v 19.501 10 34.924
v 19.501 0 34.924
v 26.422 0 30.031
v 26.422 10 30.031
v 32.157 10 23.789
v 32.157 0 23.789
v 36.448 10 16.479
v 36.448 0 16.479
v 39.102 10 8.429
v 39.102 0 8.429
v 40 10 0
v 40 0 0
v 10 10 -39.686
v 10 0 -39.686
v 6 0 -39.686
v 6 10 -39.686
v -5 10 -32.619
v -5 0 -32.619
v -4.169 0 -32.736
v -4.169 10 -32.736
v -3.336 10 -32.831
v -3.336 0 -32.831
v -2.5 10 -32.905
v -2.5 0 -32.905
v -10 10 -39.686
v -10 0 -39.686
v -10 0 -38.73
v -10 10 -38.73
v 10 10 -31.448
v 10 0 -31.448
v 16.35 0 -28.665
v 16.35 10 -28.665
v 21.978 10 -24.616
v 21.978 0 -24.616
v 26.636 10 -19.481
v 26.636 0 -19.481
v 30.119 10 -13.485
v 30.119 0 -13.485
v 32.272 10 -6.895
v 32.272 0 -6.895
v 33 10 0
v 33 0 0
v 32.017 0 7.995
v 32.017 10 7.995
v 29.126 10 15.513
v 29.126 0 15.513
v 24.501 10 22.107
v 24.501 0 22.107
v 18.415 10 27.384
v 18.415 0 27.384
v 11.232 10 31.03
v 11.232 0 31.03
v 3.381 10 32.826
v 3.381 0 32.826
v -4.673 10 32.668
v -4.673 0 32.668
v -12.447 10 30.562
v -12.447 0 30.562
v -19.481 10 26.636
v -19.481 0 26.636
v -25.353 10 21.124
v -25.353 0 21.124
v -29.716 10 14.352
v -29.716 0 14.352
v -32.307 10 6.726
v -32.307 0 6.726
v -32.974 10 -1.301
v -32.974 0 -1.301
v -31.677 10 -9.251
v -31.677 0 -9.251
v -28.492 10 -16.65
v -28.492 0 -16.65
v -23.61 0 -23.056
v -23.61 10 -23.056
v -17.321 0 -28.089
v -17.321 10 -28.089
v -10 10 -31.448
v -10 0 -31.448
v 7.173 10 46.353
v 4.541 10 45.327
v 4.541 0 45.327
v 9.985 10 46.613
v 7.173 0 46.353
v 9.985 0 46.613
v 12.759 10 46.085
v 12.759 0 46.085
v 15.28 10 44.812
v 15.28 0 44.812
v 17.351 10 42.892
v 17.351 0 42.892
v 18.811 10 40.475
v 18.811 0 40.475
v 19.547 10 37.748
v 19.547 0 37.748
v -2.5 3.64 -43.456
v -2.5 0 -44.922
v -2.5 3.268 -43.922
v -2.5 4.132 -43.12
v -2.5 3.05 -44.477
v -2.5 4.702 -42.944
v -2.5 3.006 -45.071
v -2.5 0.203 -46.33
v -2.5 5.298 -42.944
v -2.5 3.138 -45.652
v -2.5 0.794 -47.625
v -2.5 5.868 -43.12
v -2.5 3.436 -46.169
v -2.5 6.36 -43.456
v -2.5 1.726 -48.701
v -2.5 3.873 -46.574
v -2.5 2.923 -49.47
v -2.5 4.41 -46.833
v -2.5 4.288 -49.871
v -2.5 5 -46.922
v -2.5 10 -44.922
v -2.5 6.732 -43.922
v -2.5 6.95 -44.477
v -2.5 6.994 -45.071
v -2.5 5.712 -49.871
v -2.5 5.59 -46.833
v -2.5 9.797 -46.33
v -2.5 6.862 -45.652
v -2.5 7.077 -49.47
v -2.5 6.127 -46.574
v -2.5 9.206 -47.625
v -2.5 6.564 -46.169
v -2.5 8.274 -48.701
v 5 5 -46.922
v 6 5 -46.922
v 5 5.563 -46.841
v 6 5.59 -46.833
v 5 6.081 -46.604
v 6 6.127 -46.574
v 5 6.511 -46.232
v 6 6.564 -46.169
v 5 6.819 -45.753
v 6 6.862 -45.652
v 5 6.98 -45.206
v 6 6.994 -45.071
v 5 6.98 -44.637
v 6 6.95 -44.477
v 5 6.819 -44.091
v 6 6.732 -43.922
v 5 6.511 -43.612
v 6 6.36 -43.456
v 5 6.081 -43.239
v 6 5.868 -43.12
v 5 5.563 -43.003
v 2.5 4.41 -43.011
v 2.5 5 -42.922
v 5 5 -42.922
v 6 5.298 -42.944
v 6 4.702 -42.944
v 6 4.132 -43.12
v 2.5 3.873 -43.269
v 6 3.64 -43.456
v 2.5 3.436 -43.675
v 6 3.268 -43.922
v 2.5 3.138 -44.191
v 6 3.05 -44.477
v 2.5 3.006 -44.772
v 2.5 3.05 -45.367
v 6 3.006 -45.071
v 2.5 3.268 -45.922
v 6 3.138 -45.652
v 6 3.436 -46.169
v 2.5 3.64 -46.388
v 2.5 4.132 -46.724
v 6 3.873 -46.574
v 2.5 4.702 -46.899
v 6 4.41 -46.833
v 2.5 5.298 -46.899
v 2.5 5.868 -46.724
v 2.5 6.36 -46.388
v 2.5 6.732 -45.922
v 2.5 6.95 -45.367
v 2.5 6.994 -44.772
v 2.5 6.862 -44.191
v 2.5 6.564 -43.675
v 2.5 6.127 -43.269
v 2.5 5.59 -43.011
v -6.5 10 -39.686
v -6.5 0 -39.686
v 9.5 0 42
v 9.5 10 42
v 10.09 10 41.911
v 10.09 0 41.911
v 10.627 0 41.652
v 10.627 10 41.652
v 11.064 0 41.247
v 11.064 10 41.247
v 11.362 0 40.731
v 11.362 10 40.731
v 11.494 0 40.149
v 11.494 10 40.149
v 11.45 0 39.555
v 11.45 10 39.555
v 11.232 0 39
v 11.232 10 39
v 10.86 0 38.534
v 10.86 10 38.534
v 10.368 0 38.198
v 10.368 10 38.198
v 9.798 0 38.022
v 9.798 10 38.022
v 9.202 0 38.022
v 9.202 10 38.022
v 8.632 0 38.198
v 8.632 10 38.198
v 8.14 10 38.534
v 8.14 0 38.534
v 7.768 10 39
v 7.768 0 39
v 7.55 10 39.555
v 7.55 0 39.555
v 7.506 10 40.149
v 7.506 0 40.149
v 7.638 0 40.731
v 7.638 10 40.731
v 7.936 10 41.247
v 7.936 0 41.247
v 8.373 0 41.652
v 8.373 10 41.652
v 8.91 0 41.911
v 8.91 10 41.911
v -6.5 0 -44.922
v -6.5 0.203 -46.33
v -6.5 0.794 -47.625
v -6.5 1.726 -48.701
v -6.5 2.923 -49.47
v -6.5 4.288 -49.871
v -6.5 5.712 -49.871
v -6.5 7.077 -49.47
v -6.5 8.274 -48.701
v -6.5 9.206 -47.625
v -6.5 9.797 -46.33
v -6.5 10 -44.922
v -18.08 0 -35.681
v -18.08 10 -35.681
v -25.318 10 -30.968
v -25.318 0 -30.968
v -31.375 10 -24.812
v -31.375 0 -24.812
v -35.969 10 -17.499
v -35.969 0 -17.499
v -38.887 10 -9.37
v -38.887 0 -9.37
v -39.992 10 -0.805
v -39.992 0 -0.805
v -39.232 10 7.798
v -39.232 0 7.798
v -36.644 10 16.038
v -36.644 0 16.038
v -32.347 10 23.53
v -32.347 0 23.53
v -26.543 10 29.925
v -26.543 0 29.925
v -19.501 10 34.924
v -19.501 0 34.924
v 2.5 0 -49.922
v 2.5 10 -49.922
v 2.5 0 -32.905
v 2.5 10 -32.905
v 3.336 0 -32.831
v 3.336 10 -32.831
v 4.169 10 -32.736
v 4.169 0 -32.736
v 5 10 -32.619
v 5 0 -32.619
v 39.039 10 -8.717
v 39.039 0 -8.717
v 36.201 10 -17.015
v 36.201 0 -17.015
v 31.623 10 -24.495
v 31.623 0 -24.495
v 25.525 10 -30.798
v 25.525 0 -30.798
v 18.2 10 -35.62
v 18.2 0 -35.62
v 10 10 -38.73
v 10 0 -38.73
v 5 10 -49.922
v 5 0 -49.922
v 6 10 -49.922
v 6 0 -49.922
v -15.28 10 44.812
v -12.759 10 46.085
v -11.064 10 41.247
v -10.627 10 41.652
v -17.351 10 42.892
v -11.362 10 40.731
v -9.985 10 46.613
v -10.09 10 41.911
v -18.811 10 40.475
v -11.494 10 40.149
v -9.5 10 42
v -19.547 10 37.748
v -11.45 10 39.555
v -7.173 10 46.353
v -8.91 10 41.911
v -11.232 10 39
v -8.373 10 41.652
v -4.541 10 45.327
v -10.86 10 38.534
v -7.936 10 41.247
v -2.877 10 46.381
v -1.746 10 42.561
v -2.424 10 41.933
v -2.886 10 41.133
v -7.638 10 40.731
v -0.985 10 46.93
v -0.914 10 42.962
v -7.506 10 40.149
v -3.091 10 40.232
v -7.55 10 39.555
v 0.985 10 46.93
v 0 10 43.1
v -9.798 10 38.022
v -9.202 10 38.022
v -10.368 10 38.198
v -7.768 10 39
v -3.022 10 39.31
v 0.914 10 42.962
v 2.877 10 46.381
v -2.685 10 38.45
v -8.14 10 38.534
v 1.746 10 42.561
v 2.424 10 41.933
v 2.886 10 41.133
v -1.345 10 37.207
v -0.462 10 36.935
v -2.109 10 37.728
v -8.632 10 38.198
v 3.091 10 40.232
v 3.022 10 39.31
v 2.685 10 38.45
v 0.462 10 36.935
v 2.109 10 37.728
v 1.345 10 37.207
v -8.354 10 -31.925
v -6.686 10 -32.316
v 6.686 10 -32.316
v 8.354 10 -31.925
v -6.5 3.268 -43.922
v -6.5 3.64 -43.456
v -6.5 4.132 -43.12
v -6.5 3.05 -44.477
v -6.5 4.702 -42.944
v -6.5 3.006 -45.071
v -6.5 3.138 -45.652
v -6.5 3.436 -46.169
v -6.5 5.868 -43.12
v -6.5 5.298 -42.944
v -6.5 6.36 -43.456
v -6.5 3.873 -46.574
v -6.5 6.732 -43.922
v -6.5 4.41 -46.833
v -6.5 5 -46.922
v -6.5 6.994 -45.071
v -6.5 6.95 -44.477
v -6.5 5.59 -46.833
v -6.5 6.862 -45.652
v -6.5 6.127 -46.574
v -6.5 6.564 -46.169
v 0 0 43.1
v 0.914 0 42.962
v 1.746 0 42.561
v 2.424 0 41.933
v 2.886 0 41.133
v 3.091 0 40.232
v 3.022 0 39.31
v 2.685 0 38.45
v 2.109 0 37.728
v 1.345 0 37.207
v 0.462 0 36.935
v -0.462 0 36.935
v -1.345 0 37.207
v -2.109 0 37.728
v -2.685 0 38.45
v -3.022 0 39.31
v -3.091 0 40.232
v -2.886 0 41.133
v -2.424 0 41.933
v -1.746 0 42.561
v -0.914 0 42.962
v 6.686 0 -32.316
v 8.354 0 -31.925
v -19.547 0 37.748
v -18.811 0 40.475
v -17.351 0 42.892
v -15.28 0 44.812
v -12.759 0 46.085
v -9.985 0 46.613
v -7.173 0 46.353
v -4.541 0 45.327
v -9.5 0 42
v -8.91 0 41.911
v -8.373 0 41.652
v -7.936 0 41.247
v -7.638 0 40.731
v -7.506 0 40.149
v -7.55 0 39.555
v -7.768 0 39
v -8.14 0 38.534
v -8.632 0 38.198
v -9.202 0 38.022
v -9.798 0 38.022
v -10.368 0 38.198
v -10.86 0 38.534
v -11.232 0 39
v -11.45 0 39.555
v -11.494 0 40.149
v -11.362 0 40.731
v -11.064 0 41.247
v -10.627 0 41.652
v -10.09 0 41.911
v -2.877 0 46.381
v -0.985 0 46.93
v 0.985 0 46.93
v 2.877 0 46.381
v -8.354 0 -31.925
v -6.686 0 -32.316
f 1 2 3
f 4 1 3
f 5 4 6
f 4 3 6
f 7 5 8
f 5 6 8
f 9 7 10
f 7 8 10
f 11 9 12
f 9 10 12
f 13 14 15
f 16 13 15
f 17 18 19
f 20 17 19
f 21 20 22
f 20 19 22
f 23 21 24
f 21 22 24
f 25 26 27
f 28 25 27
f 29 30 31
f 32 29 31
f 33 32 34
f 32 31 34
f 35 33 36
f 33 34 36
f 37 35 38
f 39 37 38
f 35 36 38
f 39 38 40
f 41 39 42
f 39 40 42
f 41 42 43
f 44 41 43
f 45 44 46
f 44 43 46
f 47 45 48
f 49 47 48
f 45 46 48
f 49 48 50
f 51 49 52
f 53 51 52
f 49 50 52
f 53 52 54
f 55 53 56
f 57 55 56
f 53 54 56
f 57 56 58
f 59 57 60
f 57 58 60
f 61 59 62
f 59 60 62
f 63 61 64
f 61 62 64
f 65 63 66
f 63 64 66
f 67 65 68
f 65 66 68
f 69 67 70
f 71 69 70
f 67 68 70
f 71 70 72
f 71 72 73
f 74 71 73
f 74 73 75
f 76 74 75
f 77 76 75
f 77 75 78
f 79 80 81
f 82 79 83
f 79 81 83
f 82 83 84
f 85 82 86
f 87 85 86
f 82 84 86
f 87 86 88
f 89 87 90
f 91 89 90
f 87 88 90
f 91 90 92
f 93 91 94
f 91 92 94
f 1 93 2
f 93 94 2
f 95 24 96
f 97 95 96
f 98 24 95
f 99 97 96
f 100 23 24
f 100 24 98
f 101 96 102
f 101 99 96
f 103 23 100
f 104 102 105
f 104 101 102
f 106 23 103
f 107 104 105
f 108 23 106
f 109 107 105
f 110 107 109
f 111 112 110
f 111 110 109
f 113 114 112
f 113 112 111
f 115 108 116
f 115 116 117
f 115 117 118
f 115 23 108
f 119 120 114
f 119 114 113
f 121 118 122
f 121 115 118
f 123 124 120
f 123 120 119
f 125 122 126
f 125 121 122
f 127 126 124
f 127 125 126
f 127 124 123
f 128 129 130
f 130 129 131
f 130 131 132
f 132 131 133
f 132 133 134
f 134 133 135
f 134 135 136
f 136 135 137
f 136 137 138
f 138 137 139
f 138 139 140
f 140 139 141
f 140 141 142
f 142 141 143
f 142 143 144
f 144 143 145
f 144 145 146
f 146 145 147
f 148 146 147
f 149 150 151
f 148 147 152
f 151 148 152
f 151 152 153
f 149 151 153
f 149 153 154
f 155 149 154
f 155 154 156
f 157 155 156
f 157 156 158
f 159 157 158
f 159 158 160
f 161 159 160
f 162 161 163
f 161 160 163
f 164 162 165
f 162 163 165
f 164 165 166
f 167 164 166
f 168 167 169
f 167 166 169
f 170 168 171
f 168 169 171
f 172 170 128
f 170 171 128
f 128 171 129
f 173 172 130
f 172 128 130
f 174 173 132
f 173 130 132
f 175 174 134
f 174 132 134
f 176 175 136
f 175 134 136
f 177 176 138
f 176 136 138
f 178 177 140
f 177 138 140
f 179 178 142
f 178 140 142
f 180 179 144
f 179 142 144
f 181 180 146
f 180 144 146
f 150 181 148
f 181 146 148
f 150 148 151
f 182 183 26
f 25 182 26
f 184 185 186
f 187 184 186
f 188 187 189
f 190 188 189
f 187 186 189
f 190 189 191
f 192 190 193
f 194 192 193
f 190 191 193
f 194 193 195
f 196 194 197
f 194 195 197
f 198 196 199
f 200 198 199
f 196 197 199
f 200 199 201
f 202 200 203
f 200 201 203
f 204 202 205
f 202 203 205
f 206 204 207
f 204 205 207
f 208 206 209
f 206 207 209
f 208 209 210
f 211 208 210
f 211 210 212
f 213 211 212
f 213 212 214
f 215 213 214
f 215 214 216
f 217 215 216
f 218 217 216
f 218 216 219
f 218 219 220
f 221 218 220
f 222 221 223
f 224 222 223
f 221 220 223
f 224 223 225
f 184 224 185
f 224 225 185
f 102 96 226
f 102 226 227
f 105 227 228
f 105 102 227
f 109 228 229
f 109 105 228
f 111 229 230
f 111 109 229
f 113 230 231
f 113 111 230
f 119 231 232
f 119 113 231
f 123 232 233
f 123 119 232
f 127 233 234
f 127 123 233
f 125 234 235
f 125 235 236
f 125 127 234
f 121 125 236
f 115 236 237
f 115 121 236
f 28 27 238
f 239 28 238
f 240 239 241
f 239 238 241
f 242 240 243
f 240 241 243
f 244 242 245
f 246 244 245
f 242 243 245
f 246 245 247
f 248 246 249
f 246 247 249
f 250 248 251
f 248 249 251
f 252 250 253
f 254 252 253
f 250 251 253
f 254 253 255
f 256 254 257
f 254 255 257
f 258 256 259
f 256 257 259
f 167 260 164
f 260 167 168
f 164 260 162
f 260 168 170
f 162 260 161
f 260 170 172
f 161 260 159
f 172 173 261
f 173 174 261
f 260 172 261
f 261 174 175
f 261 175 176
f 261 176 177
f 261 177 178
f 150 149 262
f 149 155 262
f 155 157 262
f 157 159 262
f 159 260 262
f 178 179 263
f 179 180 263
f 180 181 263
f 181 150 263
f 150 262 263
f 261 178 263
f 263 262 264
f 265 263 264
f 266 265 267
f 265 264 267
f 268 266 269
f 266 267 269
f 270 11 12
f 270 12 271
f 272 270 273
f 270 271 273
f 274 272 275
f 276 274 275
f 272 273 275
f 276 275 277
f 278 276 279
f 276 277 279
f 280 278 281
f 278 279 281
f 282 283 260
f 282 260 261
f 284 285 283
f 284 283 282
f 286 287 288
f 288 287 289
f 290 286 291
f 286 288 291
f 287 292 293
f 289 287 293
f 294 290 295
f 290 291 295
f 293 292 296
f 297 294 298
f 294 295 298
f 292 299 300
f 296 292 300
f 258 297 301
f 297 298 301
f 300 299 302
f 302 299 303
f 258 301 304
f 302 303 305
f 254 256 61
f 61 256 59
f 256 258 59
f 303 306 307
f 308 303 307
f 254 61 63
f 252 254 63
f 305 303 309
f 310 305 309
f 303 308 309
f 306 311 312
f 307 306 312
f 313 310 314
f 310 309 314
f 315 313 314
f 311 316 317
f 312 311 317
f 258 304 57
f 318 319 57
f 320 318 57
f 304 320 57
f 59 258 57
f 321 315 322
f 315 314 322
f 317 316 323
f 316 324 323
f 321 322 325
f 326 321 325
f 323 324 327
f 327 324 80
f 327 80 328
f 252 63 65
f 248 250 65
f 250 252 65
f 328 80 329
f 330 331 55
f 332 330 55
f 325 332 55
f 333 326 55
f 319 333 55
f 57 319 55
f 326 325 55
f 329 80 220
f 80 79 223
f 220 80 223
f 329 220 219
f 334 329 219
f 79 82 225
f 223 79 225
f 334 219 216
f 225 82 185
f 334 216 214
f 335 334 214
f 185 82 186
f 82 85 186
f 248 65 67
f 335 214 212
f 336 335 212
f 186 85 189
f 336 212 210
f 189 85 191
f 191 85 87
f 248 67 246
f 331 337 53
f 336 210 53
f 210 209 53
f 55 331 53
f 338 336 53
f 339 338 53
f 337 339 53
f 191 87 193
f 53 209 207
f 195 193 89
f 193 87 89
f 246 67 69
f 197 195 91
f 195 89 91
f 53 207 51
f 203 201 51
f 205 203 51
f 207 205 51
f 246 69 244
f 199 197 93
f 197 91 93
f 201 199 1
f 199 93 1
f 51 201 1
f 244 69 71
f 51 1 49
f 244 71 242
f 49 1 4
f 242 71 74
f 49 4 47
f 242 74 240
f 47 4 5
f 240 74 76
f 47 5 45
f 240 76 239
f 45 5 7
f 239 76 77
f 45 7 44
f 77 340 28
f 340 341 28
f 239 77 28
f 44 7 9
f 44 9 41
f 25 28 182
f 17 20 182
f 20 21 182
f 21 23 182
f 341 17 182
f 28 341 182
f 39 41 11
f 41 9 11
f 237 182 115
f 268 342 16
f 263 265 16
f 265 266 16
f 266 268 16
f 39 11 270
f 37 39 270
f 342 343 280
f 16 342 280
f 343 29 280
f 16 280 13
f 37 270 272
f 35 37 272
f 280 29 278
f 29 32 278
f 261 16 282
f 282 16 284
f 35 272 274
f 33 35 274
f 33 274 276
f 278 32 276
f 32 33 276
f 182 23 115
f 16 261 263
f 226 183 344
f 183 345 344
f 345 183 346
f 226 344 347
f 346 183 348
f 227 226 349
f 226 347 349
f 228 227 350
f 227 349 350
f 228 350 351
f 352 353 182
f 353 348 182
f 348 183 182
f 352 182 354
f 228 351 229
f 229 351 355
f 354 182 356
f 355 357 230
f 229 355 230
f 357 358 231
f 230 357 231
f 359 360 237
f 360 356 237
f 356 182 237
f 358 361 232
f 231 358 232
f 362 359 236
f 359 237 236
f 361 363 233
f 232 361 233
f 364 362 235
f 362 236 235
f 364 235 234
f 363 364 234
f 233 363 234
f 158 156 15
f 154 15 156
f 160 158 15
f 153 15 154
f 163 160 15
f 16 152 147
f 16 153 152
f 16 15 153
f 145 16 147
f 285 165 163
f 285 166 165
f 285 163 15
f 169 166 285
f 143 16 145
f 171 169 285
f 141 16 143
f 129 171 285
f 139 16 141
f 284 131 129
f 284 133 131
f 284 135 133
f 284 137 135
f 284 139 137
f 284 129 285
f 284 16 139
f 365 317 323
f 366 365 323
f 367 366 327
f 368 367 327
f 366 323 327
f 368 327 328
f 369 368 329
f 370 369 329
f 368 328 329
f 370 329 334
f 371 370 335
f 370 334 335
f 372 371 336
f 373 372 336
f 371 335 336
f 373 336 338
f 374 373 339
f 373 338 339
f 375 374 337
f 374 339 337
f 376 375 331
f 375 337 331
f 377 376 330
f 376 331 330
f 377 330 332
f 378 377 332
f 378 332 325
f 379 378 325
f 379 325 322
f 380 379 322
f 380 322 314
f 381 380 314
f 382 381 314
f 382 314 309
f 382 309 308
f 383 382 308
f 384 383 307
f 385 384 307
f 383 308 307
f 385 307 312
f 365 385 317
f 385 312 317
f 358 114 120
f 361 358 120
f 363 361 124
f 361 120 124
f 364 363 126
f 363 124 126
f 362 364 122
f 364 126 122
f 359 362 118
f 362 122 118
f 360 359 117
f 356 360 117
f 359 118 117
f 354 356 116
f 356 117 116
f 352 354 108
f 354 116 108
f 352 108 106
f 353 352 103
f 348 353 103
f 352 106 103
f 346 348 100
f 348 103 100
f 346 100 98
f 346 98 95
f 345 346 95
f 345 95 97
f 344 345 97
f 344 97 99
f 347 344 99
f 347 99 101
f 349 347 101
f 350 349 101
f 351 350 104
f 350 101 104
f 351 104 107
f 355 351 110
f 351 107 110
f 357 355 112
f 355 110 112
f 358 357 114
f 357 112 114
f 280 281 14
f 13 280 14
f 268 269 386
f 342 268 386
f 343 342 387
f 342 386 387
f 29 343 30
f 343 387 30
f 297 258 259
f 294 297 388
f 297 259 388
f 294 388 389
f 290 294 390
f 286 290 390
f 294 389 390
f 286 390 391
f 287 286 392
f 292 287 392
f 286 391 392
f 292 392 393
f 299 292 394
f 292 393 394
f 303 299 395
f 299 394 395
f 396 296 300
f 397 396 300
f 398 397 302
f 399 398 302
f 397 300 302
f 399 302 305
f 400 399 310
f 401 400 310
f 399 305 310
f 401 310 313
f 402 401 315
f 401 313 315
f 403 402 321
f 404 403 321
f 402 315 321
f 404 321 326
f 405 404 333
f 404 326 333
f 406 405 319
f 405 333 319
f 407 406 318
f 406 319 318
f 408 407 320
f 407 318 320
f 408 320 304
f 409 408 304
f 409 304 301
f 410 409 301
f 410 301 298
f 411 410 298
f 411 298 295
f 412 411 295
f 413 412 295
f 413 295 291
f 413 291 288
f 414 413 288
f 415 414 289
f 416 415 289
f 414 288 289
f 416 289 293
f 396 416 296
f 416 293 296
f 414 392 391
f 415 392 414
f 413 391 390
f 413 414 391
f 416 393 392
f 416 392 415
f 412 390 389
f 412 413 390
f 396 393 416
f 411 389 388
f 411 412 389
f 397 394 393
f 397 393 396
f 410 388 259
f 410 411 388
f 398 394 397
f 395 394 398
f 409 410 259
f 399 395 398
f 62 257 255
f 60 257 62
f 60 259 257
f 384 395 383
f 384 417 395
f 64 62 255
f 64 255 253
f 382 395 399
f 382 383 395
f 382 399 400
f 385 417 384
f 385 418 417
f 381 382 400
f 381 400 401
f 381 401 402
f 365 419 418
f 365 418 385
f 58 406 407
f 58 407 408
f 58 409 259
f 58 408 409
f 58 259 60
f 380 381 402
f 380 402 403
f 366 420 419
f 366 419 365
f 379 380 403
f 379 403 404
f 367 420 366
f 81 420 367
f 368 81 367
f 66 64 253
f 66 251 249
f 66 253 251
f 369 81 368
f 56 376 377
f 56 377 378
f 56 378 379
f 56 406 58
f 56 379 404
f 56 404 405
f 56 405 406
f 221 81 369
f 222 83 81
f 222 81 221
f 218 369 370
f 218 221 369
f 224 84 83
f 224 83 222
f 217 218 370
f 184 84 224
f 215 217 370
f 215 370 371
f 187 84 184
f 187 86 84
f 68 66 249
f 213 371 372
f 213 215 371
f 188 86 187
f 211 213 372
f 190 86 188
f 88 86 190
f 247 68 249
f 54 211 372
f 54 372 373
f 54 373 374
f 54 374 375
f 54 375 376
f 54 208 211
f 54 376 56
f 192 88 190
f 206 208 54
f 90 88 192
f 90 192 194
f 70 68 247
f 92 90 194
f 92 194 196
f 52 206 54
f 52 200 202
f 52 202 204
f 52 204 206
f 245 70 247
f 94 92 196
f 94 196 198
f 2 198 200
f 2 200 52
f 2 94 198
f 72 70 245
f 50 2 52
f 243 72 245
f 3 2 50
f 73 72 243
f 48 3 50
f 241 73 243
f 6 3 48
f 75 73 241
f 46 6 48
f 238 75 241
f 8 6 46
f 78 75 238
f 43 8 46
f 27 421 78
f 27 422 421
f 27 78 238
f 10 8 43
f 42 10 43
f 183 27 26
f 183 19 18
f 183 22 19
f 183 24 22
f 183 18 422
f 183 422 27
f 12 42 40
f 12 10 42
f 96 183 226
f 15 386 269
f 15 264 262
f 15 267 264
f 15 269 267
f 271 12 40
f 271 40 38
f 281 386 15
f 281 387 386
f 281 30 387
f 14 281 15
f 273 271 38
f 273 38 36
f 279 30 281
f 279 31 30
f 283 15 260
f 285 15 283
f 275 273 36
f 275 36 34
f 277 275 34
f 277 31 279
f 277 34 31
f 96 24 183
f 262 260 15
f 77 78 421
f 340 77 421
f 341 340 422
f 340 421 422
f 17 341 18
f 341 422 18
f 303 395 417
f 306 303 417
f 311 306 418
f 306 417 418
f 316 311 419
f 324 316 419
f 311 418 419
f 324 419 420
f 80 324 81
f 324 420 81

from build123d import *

# Parameters (mm, degrees)
SALIENTE_EXTRUIR1_DEPTH  = 10
SALIENTE_EXTRUIR2_START  = -10
SALIENTE_EXTRUIR2_DEPTH  = 10
CROQUIS8_R               = 2
CORTAR_EXTRUIR1_DEPTH    = 10
CROQUIS10_R              = 3.1
CORTAR_EXTRUIR3_DEPTH    = 10
CROQUIS11_W              = 2.5
CROQUIS11_H              = 10
SALIENTE_EXTRUIR5_DEPTH  = 5
CROQUIS13_R              = 2
CORTAR_EXTRUIR4_DEPTH    = 2.5
CROQUIS14_W              = 2.5
CROQUIS14_H              = 10
SALIENTE_EXTRUIR7_DEPTH  = 10
CORTAR_EXTRUIR5_START    = 10
CROQUIS15_R              = 2
CORTAR_EXTRUIR5_DEPTH    = 10
CROQUIS12_R              = 5
CROQUIS12_R_2            = 2
SALIENTE_EXTRUIR8_DEPTH  = 4
SALIENTE_EXTRUIR9_DEPTH  = 1.5
SALIENTE_EXTRUIR10_START = 1
CROQUIS17_W              = 10.235528891
CROQUIS17_H              = 10
CROQUIS17_R              = 2
SALIENTE_EXTRUIR10_DEPTH = 1


with BuildPart() as part:
    # Croquis1 → Saliente-Extruir1 (new body)
    with BuildSketch(Plane(origin=(0, 0, 0), x_dir=(1, 0, 0), z_dir=(0, 1, 0))):
        with BuildLine():
            Line((10, 38.729833462), (10, 32.619012861))
            Line((10, 32.619012861), (10, 31.448370387))
            ThreePointArc((10, 31.448370387), (26.636441204, 19.480759739), (33, 0))
            ThreePointArc((33, 0), (-19.480759739, -26.636441204), (-10, 31.448370387))
            Line((-10, 31.448370387), (-10, 38.729833462))
            ThreePointArc((-10, 38.729833462), (-24.494897428, -31.622776602), (40, 0))
            ThreePointArc((40, 0), (31.622776602, 24.494897428), (10, 38.729833462))
        make_face()
        with BuildLine():
            ThreePointArc((-10, 31.448370387), (-7.522805391, 32.131097072), (-5, 32.619012861))
            Line((-5, 32.619012861), (-5, 39.686269666))
            ThreePointArc((-5, 39.686269666), (-7.515230705, 39.287673734), (-10, 38.729833462))
            Line((-10, 38.729833462), (-10, 31.448370387))
        make_face()
        with BuildLine():
            Line((5, 39.686269666), (5, 32.619012861))
            Line((5, 32.619012861), (10, 32.619012861))
            Line((10, 32.619012861), (10, 38.729833462))
            ThreePointArc((10, 38.729833462), (7.515230705, 39.287673734), (5, 39.686269666))
        make_face()
        with BuildLine():
            Line((10, 39.686269666), (5, 39.686269666))
            ThreePointArc((5, 39.686269666), (7.515230705, 39.287673734), (10, 38.729833462))
            Line((10, 38.729833462), (10, 39.686269666))
        make_face()
        with BuildLine():
            ThreePointArc((-10, 38.729833462), (-7.515230705, 39.287673734), (-5, 39.686269666))
            Line((-5, 39.686269666), (-10, 39.686269666))
            Line((-10, 39.686269666), (-10, 38.729833462))
        make_face()
        with BuildLine():
            Line((10, 32.619012861), (5, 32.619012861))
            ThreePointArc((5, 32.619012861), (7.522805391, 32.131097072), (10, 31.448370387))
            Line((10, 31.448370387), (10, 32.619012861))
        make_face()
        with BuildLine():
            ThreePointArc((-5, 32.619012861), (-3.752728476, 32.785927301), (-2.5, 32.905166768))
            Line((-2.5, 32.905166768), (-2.5, 39.921798557))
            ThreePointArc((-2.5, 39.921798557), (-3.751848673, 39.823656682), (-5, 39.686269666))
            Line((-5, 39.686269666), (-5, 32.619012861))
        make_face()
        with BuildLine():
            ThreePointArc((-5, 39.686269666), (-3.751848673, 39.823656682), (-2.5, 39.921798557))
            Line((-2.5, 39.921798557), (-5, 39.921798557))
            Line((-5, 39.921798557), (-5, 39.686269666))
        make_face()
        with BuildLine():
            Line((2.5, 39.921798557), (2.5, 32.905166768))
            ThreePointArc((2.5, 32.905166768), (3.752728476, 32.785927301), (5, 32.619012861))
            Line((5, 32.619012861), (5, 39.686269666))
            ThreePointArc((5, 39.686269666), (3.751848673, 39.823656682), (2.5, 39.921798557))
        make_face()
        with BuildLine():
            Line((5, 39.921798557), (2.5, 39.921798557))
            ThreePointArc((2.5, 39.921798557), (3.751848673, 39.823656682), (5, 39.686269666))
            Line((5, 39.686269666), (5, 39.921798557))
        make_face()
    extrude(amount=SALIENTE_EXTRUIR1_DEPTH)

    # Croquis2 → Saliente-Extruir2 (add)
    with BuildSketch(Plane(origin=(0, 10, 0), x_dir=(1, 0, 0), z_dir=(0, 1, 0)).offset(SALIENTE_EXTRUIR2_START)):
        with BuildLine():
            ThreePointArc((4.541463415, -45.326829268), (15.280033507, -44.812112406), (19.500878735, -34.924428822))
            ThreePointArc((19.500878735, -34.924428822), (0, -40), (-19.500878735, -34.924428822))
            ThreePointArc((-19.500878735, -34.924428822), (-15.280033507, -44.812112406), (-4.541463415, -45.326829268))
            ThreePointArc((-4.541463415, -45.326829268), (0, -47), (4.541463415, -45.326829268))
        make_face()
    extrude(amount=SALIENTE_EXTRUIR2_DEPTH)

    # Croquis8 → Cortar-Extruir1 (cut)
    with BuildSketch(Plane(origin=(0, 10, 0), x_dir=(1, 0, 0), z_dir=(0, 1, 0))):
        with Locations(Location((9.5, -40, 0), (0, 0, 270))):
            Circle(CROQUIS8_R)
        with Locations(Location((-9.5, -40, 0), (0, 0, 270))):
            Circle(CROQUIS8_R)
    extrude(amount=-CORTAR_EXTRUIR1_DEPTH, mode=Mode.SUBTRACT)

    # Croquis10 → Cortar-Extruir3 (cut)
    with BuildSketch(Plane(origin=(0, 10, 0), x_dir=(1, 0, 0), z_dir=(0, 1, 0))):
        with Locations(Location((0, -40, 0), (0, 0, 270))):
            Circle(CROQUIS10_R)
    extrude(amount=-CORTAR_EXTRUIR3_DEPTH, mode=Mode.SUBTRACT)

    # Croquis11 → Saliente-Extruir5 (add)
    with BuildSketch(Plane(origin=(0, 0, -39.921798557), x_dir=(-1, 0, 0), z_dir=(0, 0, -1))):
        with Locations((3.75, 5)):
            Rectangle(CROQUIS11_W, CROQUIS11_H)
    extrude(amount=SALIENTE_EXTRUIR5_DEPTH)

    # Croquis13 → Cortar-Extruir4 (cut)
    with BuildSketch(Plane(origin=(-2.5, 0, 0), x_dir=(0, 0, -1), z_dir=(1, 0, 0))):
        with Locations((44.921798557, 5)):
            Circle(CROQUIS13_R)
    extrude(amount=-CORTAR_EXTRUIR4_DEPTH, mode=Mode.SUBTRACT)

    # Croquis14 → Saliente-Extruir7 (add)
    with BuildSketch(Plane(origin=(0, 0, -39.921798557), x_dir=(-1, 0, 0), z_dir=(0, 0, -1))):
        with Locations((-3.75, 5)):
            Rectangle(CROQUIS14_W, CROQUIS14_H)
    extrude(amount=SALIENTE_EXTRUIR7_DEPTH)

    # Croquis15 → Cortar-Extruir5 (cut)
    with BuildSketch(Plane(origin=(-2.5, 0, 0), x_dir=(0, 0, -1), z_dir=(1, 0, 0)).offset(CORTAR_EXTRUIR5_START)):
        with Locations(Location((44.921798557, 5, 0), (0, 0, 180))):
            Circle(CROQUIS15_R)
    extrude(amount=-CORTAR_EXTRUIR5_DEPTH, mode=Mode.SUBTRACT)

    # Croquis12 → Saliente-Extruir8 (add)
    with BuildSketch(Plane(origin=(-2.5, 0, 0), x_dir=(0, 0, -1), z_dir=(1, 0, 0))):
        with Locations((44.921798557, 5)):
            Circle(CROQUIS12_R)
        with Locations((44.921798557, 5)):
            Circle(CROQUIS12_R_2, mode=Mode.SUBTRACT)
    extrude(amount=-SALIENTE_EXTRUIR8_DEPTH)

    # Croquis16 → Saliente-Extruir9 (add)
    with BuildSketch(Plane.ZY.offset(5)):
        with BuildLine():
            Line((-44.921798557, 10), (-39.686269666, 10))
            Line((-39.686269666, 10), (-39.686269666, 0))
            Line((-39.686269666, 0), (-44.921798557, 0))
            ThreePointArc((-44.921798557, 0), (-39.921798557, 5), (-44.921798557, 10))
        make_face()
    extrude(amount=SALIENTE_EXTRUIR9_DEPTH)

    # Croquis17 → Saliente-Extruir10 (add)
    with BuildSketch(Plane(origin=(5, 0, 0), x_dir=(0, 0, -1), z_dir=(1, 0, 0)).offset(SALIENTE_EXTRUIR10_START)):
        with Locations((44.804034112, 5)):
            Rectangle(CROQUIS17_W, CROQUIS17_H)
        with Locations((44.921798557, 5)):
            Circle(CROQUIS17_R, mode=Mode.SUBTRACT)
    extrude(amount=-SALIENTE_EXTRUIR10_DEPTH)


solid = part.part
